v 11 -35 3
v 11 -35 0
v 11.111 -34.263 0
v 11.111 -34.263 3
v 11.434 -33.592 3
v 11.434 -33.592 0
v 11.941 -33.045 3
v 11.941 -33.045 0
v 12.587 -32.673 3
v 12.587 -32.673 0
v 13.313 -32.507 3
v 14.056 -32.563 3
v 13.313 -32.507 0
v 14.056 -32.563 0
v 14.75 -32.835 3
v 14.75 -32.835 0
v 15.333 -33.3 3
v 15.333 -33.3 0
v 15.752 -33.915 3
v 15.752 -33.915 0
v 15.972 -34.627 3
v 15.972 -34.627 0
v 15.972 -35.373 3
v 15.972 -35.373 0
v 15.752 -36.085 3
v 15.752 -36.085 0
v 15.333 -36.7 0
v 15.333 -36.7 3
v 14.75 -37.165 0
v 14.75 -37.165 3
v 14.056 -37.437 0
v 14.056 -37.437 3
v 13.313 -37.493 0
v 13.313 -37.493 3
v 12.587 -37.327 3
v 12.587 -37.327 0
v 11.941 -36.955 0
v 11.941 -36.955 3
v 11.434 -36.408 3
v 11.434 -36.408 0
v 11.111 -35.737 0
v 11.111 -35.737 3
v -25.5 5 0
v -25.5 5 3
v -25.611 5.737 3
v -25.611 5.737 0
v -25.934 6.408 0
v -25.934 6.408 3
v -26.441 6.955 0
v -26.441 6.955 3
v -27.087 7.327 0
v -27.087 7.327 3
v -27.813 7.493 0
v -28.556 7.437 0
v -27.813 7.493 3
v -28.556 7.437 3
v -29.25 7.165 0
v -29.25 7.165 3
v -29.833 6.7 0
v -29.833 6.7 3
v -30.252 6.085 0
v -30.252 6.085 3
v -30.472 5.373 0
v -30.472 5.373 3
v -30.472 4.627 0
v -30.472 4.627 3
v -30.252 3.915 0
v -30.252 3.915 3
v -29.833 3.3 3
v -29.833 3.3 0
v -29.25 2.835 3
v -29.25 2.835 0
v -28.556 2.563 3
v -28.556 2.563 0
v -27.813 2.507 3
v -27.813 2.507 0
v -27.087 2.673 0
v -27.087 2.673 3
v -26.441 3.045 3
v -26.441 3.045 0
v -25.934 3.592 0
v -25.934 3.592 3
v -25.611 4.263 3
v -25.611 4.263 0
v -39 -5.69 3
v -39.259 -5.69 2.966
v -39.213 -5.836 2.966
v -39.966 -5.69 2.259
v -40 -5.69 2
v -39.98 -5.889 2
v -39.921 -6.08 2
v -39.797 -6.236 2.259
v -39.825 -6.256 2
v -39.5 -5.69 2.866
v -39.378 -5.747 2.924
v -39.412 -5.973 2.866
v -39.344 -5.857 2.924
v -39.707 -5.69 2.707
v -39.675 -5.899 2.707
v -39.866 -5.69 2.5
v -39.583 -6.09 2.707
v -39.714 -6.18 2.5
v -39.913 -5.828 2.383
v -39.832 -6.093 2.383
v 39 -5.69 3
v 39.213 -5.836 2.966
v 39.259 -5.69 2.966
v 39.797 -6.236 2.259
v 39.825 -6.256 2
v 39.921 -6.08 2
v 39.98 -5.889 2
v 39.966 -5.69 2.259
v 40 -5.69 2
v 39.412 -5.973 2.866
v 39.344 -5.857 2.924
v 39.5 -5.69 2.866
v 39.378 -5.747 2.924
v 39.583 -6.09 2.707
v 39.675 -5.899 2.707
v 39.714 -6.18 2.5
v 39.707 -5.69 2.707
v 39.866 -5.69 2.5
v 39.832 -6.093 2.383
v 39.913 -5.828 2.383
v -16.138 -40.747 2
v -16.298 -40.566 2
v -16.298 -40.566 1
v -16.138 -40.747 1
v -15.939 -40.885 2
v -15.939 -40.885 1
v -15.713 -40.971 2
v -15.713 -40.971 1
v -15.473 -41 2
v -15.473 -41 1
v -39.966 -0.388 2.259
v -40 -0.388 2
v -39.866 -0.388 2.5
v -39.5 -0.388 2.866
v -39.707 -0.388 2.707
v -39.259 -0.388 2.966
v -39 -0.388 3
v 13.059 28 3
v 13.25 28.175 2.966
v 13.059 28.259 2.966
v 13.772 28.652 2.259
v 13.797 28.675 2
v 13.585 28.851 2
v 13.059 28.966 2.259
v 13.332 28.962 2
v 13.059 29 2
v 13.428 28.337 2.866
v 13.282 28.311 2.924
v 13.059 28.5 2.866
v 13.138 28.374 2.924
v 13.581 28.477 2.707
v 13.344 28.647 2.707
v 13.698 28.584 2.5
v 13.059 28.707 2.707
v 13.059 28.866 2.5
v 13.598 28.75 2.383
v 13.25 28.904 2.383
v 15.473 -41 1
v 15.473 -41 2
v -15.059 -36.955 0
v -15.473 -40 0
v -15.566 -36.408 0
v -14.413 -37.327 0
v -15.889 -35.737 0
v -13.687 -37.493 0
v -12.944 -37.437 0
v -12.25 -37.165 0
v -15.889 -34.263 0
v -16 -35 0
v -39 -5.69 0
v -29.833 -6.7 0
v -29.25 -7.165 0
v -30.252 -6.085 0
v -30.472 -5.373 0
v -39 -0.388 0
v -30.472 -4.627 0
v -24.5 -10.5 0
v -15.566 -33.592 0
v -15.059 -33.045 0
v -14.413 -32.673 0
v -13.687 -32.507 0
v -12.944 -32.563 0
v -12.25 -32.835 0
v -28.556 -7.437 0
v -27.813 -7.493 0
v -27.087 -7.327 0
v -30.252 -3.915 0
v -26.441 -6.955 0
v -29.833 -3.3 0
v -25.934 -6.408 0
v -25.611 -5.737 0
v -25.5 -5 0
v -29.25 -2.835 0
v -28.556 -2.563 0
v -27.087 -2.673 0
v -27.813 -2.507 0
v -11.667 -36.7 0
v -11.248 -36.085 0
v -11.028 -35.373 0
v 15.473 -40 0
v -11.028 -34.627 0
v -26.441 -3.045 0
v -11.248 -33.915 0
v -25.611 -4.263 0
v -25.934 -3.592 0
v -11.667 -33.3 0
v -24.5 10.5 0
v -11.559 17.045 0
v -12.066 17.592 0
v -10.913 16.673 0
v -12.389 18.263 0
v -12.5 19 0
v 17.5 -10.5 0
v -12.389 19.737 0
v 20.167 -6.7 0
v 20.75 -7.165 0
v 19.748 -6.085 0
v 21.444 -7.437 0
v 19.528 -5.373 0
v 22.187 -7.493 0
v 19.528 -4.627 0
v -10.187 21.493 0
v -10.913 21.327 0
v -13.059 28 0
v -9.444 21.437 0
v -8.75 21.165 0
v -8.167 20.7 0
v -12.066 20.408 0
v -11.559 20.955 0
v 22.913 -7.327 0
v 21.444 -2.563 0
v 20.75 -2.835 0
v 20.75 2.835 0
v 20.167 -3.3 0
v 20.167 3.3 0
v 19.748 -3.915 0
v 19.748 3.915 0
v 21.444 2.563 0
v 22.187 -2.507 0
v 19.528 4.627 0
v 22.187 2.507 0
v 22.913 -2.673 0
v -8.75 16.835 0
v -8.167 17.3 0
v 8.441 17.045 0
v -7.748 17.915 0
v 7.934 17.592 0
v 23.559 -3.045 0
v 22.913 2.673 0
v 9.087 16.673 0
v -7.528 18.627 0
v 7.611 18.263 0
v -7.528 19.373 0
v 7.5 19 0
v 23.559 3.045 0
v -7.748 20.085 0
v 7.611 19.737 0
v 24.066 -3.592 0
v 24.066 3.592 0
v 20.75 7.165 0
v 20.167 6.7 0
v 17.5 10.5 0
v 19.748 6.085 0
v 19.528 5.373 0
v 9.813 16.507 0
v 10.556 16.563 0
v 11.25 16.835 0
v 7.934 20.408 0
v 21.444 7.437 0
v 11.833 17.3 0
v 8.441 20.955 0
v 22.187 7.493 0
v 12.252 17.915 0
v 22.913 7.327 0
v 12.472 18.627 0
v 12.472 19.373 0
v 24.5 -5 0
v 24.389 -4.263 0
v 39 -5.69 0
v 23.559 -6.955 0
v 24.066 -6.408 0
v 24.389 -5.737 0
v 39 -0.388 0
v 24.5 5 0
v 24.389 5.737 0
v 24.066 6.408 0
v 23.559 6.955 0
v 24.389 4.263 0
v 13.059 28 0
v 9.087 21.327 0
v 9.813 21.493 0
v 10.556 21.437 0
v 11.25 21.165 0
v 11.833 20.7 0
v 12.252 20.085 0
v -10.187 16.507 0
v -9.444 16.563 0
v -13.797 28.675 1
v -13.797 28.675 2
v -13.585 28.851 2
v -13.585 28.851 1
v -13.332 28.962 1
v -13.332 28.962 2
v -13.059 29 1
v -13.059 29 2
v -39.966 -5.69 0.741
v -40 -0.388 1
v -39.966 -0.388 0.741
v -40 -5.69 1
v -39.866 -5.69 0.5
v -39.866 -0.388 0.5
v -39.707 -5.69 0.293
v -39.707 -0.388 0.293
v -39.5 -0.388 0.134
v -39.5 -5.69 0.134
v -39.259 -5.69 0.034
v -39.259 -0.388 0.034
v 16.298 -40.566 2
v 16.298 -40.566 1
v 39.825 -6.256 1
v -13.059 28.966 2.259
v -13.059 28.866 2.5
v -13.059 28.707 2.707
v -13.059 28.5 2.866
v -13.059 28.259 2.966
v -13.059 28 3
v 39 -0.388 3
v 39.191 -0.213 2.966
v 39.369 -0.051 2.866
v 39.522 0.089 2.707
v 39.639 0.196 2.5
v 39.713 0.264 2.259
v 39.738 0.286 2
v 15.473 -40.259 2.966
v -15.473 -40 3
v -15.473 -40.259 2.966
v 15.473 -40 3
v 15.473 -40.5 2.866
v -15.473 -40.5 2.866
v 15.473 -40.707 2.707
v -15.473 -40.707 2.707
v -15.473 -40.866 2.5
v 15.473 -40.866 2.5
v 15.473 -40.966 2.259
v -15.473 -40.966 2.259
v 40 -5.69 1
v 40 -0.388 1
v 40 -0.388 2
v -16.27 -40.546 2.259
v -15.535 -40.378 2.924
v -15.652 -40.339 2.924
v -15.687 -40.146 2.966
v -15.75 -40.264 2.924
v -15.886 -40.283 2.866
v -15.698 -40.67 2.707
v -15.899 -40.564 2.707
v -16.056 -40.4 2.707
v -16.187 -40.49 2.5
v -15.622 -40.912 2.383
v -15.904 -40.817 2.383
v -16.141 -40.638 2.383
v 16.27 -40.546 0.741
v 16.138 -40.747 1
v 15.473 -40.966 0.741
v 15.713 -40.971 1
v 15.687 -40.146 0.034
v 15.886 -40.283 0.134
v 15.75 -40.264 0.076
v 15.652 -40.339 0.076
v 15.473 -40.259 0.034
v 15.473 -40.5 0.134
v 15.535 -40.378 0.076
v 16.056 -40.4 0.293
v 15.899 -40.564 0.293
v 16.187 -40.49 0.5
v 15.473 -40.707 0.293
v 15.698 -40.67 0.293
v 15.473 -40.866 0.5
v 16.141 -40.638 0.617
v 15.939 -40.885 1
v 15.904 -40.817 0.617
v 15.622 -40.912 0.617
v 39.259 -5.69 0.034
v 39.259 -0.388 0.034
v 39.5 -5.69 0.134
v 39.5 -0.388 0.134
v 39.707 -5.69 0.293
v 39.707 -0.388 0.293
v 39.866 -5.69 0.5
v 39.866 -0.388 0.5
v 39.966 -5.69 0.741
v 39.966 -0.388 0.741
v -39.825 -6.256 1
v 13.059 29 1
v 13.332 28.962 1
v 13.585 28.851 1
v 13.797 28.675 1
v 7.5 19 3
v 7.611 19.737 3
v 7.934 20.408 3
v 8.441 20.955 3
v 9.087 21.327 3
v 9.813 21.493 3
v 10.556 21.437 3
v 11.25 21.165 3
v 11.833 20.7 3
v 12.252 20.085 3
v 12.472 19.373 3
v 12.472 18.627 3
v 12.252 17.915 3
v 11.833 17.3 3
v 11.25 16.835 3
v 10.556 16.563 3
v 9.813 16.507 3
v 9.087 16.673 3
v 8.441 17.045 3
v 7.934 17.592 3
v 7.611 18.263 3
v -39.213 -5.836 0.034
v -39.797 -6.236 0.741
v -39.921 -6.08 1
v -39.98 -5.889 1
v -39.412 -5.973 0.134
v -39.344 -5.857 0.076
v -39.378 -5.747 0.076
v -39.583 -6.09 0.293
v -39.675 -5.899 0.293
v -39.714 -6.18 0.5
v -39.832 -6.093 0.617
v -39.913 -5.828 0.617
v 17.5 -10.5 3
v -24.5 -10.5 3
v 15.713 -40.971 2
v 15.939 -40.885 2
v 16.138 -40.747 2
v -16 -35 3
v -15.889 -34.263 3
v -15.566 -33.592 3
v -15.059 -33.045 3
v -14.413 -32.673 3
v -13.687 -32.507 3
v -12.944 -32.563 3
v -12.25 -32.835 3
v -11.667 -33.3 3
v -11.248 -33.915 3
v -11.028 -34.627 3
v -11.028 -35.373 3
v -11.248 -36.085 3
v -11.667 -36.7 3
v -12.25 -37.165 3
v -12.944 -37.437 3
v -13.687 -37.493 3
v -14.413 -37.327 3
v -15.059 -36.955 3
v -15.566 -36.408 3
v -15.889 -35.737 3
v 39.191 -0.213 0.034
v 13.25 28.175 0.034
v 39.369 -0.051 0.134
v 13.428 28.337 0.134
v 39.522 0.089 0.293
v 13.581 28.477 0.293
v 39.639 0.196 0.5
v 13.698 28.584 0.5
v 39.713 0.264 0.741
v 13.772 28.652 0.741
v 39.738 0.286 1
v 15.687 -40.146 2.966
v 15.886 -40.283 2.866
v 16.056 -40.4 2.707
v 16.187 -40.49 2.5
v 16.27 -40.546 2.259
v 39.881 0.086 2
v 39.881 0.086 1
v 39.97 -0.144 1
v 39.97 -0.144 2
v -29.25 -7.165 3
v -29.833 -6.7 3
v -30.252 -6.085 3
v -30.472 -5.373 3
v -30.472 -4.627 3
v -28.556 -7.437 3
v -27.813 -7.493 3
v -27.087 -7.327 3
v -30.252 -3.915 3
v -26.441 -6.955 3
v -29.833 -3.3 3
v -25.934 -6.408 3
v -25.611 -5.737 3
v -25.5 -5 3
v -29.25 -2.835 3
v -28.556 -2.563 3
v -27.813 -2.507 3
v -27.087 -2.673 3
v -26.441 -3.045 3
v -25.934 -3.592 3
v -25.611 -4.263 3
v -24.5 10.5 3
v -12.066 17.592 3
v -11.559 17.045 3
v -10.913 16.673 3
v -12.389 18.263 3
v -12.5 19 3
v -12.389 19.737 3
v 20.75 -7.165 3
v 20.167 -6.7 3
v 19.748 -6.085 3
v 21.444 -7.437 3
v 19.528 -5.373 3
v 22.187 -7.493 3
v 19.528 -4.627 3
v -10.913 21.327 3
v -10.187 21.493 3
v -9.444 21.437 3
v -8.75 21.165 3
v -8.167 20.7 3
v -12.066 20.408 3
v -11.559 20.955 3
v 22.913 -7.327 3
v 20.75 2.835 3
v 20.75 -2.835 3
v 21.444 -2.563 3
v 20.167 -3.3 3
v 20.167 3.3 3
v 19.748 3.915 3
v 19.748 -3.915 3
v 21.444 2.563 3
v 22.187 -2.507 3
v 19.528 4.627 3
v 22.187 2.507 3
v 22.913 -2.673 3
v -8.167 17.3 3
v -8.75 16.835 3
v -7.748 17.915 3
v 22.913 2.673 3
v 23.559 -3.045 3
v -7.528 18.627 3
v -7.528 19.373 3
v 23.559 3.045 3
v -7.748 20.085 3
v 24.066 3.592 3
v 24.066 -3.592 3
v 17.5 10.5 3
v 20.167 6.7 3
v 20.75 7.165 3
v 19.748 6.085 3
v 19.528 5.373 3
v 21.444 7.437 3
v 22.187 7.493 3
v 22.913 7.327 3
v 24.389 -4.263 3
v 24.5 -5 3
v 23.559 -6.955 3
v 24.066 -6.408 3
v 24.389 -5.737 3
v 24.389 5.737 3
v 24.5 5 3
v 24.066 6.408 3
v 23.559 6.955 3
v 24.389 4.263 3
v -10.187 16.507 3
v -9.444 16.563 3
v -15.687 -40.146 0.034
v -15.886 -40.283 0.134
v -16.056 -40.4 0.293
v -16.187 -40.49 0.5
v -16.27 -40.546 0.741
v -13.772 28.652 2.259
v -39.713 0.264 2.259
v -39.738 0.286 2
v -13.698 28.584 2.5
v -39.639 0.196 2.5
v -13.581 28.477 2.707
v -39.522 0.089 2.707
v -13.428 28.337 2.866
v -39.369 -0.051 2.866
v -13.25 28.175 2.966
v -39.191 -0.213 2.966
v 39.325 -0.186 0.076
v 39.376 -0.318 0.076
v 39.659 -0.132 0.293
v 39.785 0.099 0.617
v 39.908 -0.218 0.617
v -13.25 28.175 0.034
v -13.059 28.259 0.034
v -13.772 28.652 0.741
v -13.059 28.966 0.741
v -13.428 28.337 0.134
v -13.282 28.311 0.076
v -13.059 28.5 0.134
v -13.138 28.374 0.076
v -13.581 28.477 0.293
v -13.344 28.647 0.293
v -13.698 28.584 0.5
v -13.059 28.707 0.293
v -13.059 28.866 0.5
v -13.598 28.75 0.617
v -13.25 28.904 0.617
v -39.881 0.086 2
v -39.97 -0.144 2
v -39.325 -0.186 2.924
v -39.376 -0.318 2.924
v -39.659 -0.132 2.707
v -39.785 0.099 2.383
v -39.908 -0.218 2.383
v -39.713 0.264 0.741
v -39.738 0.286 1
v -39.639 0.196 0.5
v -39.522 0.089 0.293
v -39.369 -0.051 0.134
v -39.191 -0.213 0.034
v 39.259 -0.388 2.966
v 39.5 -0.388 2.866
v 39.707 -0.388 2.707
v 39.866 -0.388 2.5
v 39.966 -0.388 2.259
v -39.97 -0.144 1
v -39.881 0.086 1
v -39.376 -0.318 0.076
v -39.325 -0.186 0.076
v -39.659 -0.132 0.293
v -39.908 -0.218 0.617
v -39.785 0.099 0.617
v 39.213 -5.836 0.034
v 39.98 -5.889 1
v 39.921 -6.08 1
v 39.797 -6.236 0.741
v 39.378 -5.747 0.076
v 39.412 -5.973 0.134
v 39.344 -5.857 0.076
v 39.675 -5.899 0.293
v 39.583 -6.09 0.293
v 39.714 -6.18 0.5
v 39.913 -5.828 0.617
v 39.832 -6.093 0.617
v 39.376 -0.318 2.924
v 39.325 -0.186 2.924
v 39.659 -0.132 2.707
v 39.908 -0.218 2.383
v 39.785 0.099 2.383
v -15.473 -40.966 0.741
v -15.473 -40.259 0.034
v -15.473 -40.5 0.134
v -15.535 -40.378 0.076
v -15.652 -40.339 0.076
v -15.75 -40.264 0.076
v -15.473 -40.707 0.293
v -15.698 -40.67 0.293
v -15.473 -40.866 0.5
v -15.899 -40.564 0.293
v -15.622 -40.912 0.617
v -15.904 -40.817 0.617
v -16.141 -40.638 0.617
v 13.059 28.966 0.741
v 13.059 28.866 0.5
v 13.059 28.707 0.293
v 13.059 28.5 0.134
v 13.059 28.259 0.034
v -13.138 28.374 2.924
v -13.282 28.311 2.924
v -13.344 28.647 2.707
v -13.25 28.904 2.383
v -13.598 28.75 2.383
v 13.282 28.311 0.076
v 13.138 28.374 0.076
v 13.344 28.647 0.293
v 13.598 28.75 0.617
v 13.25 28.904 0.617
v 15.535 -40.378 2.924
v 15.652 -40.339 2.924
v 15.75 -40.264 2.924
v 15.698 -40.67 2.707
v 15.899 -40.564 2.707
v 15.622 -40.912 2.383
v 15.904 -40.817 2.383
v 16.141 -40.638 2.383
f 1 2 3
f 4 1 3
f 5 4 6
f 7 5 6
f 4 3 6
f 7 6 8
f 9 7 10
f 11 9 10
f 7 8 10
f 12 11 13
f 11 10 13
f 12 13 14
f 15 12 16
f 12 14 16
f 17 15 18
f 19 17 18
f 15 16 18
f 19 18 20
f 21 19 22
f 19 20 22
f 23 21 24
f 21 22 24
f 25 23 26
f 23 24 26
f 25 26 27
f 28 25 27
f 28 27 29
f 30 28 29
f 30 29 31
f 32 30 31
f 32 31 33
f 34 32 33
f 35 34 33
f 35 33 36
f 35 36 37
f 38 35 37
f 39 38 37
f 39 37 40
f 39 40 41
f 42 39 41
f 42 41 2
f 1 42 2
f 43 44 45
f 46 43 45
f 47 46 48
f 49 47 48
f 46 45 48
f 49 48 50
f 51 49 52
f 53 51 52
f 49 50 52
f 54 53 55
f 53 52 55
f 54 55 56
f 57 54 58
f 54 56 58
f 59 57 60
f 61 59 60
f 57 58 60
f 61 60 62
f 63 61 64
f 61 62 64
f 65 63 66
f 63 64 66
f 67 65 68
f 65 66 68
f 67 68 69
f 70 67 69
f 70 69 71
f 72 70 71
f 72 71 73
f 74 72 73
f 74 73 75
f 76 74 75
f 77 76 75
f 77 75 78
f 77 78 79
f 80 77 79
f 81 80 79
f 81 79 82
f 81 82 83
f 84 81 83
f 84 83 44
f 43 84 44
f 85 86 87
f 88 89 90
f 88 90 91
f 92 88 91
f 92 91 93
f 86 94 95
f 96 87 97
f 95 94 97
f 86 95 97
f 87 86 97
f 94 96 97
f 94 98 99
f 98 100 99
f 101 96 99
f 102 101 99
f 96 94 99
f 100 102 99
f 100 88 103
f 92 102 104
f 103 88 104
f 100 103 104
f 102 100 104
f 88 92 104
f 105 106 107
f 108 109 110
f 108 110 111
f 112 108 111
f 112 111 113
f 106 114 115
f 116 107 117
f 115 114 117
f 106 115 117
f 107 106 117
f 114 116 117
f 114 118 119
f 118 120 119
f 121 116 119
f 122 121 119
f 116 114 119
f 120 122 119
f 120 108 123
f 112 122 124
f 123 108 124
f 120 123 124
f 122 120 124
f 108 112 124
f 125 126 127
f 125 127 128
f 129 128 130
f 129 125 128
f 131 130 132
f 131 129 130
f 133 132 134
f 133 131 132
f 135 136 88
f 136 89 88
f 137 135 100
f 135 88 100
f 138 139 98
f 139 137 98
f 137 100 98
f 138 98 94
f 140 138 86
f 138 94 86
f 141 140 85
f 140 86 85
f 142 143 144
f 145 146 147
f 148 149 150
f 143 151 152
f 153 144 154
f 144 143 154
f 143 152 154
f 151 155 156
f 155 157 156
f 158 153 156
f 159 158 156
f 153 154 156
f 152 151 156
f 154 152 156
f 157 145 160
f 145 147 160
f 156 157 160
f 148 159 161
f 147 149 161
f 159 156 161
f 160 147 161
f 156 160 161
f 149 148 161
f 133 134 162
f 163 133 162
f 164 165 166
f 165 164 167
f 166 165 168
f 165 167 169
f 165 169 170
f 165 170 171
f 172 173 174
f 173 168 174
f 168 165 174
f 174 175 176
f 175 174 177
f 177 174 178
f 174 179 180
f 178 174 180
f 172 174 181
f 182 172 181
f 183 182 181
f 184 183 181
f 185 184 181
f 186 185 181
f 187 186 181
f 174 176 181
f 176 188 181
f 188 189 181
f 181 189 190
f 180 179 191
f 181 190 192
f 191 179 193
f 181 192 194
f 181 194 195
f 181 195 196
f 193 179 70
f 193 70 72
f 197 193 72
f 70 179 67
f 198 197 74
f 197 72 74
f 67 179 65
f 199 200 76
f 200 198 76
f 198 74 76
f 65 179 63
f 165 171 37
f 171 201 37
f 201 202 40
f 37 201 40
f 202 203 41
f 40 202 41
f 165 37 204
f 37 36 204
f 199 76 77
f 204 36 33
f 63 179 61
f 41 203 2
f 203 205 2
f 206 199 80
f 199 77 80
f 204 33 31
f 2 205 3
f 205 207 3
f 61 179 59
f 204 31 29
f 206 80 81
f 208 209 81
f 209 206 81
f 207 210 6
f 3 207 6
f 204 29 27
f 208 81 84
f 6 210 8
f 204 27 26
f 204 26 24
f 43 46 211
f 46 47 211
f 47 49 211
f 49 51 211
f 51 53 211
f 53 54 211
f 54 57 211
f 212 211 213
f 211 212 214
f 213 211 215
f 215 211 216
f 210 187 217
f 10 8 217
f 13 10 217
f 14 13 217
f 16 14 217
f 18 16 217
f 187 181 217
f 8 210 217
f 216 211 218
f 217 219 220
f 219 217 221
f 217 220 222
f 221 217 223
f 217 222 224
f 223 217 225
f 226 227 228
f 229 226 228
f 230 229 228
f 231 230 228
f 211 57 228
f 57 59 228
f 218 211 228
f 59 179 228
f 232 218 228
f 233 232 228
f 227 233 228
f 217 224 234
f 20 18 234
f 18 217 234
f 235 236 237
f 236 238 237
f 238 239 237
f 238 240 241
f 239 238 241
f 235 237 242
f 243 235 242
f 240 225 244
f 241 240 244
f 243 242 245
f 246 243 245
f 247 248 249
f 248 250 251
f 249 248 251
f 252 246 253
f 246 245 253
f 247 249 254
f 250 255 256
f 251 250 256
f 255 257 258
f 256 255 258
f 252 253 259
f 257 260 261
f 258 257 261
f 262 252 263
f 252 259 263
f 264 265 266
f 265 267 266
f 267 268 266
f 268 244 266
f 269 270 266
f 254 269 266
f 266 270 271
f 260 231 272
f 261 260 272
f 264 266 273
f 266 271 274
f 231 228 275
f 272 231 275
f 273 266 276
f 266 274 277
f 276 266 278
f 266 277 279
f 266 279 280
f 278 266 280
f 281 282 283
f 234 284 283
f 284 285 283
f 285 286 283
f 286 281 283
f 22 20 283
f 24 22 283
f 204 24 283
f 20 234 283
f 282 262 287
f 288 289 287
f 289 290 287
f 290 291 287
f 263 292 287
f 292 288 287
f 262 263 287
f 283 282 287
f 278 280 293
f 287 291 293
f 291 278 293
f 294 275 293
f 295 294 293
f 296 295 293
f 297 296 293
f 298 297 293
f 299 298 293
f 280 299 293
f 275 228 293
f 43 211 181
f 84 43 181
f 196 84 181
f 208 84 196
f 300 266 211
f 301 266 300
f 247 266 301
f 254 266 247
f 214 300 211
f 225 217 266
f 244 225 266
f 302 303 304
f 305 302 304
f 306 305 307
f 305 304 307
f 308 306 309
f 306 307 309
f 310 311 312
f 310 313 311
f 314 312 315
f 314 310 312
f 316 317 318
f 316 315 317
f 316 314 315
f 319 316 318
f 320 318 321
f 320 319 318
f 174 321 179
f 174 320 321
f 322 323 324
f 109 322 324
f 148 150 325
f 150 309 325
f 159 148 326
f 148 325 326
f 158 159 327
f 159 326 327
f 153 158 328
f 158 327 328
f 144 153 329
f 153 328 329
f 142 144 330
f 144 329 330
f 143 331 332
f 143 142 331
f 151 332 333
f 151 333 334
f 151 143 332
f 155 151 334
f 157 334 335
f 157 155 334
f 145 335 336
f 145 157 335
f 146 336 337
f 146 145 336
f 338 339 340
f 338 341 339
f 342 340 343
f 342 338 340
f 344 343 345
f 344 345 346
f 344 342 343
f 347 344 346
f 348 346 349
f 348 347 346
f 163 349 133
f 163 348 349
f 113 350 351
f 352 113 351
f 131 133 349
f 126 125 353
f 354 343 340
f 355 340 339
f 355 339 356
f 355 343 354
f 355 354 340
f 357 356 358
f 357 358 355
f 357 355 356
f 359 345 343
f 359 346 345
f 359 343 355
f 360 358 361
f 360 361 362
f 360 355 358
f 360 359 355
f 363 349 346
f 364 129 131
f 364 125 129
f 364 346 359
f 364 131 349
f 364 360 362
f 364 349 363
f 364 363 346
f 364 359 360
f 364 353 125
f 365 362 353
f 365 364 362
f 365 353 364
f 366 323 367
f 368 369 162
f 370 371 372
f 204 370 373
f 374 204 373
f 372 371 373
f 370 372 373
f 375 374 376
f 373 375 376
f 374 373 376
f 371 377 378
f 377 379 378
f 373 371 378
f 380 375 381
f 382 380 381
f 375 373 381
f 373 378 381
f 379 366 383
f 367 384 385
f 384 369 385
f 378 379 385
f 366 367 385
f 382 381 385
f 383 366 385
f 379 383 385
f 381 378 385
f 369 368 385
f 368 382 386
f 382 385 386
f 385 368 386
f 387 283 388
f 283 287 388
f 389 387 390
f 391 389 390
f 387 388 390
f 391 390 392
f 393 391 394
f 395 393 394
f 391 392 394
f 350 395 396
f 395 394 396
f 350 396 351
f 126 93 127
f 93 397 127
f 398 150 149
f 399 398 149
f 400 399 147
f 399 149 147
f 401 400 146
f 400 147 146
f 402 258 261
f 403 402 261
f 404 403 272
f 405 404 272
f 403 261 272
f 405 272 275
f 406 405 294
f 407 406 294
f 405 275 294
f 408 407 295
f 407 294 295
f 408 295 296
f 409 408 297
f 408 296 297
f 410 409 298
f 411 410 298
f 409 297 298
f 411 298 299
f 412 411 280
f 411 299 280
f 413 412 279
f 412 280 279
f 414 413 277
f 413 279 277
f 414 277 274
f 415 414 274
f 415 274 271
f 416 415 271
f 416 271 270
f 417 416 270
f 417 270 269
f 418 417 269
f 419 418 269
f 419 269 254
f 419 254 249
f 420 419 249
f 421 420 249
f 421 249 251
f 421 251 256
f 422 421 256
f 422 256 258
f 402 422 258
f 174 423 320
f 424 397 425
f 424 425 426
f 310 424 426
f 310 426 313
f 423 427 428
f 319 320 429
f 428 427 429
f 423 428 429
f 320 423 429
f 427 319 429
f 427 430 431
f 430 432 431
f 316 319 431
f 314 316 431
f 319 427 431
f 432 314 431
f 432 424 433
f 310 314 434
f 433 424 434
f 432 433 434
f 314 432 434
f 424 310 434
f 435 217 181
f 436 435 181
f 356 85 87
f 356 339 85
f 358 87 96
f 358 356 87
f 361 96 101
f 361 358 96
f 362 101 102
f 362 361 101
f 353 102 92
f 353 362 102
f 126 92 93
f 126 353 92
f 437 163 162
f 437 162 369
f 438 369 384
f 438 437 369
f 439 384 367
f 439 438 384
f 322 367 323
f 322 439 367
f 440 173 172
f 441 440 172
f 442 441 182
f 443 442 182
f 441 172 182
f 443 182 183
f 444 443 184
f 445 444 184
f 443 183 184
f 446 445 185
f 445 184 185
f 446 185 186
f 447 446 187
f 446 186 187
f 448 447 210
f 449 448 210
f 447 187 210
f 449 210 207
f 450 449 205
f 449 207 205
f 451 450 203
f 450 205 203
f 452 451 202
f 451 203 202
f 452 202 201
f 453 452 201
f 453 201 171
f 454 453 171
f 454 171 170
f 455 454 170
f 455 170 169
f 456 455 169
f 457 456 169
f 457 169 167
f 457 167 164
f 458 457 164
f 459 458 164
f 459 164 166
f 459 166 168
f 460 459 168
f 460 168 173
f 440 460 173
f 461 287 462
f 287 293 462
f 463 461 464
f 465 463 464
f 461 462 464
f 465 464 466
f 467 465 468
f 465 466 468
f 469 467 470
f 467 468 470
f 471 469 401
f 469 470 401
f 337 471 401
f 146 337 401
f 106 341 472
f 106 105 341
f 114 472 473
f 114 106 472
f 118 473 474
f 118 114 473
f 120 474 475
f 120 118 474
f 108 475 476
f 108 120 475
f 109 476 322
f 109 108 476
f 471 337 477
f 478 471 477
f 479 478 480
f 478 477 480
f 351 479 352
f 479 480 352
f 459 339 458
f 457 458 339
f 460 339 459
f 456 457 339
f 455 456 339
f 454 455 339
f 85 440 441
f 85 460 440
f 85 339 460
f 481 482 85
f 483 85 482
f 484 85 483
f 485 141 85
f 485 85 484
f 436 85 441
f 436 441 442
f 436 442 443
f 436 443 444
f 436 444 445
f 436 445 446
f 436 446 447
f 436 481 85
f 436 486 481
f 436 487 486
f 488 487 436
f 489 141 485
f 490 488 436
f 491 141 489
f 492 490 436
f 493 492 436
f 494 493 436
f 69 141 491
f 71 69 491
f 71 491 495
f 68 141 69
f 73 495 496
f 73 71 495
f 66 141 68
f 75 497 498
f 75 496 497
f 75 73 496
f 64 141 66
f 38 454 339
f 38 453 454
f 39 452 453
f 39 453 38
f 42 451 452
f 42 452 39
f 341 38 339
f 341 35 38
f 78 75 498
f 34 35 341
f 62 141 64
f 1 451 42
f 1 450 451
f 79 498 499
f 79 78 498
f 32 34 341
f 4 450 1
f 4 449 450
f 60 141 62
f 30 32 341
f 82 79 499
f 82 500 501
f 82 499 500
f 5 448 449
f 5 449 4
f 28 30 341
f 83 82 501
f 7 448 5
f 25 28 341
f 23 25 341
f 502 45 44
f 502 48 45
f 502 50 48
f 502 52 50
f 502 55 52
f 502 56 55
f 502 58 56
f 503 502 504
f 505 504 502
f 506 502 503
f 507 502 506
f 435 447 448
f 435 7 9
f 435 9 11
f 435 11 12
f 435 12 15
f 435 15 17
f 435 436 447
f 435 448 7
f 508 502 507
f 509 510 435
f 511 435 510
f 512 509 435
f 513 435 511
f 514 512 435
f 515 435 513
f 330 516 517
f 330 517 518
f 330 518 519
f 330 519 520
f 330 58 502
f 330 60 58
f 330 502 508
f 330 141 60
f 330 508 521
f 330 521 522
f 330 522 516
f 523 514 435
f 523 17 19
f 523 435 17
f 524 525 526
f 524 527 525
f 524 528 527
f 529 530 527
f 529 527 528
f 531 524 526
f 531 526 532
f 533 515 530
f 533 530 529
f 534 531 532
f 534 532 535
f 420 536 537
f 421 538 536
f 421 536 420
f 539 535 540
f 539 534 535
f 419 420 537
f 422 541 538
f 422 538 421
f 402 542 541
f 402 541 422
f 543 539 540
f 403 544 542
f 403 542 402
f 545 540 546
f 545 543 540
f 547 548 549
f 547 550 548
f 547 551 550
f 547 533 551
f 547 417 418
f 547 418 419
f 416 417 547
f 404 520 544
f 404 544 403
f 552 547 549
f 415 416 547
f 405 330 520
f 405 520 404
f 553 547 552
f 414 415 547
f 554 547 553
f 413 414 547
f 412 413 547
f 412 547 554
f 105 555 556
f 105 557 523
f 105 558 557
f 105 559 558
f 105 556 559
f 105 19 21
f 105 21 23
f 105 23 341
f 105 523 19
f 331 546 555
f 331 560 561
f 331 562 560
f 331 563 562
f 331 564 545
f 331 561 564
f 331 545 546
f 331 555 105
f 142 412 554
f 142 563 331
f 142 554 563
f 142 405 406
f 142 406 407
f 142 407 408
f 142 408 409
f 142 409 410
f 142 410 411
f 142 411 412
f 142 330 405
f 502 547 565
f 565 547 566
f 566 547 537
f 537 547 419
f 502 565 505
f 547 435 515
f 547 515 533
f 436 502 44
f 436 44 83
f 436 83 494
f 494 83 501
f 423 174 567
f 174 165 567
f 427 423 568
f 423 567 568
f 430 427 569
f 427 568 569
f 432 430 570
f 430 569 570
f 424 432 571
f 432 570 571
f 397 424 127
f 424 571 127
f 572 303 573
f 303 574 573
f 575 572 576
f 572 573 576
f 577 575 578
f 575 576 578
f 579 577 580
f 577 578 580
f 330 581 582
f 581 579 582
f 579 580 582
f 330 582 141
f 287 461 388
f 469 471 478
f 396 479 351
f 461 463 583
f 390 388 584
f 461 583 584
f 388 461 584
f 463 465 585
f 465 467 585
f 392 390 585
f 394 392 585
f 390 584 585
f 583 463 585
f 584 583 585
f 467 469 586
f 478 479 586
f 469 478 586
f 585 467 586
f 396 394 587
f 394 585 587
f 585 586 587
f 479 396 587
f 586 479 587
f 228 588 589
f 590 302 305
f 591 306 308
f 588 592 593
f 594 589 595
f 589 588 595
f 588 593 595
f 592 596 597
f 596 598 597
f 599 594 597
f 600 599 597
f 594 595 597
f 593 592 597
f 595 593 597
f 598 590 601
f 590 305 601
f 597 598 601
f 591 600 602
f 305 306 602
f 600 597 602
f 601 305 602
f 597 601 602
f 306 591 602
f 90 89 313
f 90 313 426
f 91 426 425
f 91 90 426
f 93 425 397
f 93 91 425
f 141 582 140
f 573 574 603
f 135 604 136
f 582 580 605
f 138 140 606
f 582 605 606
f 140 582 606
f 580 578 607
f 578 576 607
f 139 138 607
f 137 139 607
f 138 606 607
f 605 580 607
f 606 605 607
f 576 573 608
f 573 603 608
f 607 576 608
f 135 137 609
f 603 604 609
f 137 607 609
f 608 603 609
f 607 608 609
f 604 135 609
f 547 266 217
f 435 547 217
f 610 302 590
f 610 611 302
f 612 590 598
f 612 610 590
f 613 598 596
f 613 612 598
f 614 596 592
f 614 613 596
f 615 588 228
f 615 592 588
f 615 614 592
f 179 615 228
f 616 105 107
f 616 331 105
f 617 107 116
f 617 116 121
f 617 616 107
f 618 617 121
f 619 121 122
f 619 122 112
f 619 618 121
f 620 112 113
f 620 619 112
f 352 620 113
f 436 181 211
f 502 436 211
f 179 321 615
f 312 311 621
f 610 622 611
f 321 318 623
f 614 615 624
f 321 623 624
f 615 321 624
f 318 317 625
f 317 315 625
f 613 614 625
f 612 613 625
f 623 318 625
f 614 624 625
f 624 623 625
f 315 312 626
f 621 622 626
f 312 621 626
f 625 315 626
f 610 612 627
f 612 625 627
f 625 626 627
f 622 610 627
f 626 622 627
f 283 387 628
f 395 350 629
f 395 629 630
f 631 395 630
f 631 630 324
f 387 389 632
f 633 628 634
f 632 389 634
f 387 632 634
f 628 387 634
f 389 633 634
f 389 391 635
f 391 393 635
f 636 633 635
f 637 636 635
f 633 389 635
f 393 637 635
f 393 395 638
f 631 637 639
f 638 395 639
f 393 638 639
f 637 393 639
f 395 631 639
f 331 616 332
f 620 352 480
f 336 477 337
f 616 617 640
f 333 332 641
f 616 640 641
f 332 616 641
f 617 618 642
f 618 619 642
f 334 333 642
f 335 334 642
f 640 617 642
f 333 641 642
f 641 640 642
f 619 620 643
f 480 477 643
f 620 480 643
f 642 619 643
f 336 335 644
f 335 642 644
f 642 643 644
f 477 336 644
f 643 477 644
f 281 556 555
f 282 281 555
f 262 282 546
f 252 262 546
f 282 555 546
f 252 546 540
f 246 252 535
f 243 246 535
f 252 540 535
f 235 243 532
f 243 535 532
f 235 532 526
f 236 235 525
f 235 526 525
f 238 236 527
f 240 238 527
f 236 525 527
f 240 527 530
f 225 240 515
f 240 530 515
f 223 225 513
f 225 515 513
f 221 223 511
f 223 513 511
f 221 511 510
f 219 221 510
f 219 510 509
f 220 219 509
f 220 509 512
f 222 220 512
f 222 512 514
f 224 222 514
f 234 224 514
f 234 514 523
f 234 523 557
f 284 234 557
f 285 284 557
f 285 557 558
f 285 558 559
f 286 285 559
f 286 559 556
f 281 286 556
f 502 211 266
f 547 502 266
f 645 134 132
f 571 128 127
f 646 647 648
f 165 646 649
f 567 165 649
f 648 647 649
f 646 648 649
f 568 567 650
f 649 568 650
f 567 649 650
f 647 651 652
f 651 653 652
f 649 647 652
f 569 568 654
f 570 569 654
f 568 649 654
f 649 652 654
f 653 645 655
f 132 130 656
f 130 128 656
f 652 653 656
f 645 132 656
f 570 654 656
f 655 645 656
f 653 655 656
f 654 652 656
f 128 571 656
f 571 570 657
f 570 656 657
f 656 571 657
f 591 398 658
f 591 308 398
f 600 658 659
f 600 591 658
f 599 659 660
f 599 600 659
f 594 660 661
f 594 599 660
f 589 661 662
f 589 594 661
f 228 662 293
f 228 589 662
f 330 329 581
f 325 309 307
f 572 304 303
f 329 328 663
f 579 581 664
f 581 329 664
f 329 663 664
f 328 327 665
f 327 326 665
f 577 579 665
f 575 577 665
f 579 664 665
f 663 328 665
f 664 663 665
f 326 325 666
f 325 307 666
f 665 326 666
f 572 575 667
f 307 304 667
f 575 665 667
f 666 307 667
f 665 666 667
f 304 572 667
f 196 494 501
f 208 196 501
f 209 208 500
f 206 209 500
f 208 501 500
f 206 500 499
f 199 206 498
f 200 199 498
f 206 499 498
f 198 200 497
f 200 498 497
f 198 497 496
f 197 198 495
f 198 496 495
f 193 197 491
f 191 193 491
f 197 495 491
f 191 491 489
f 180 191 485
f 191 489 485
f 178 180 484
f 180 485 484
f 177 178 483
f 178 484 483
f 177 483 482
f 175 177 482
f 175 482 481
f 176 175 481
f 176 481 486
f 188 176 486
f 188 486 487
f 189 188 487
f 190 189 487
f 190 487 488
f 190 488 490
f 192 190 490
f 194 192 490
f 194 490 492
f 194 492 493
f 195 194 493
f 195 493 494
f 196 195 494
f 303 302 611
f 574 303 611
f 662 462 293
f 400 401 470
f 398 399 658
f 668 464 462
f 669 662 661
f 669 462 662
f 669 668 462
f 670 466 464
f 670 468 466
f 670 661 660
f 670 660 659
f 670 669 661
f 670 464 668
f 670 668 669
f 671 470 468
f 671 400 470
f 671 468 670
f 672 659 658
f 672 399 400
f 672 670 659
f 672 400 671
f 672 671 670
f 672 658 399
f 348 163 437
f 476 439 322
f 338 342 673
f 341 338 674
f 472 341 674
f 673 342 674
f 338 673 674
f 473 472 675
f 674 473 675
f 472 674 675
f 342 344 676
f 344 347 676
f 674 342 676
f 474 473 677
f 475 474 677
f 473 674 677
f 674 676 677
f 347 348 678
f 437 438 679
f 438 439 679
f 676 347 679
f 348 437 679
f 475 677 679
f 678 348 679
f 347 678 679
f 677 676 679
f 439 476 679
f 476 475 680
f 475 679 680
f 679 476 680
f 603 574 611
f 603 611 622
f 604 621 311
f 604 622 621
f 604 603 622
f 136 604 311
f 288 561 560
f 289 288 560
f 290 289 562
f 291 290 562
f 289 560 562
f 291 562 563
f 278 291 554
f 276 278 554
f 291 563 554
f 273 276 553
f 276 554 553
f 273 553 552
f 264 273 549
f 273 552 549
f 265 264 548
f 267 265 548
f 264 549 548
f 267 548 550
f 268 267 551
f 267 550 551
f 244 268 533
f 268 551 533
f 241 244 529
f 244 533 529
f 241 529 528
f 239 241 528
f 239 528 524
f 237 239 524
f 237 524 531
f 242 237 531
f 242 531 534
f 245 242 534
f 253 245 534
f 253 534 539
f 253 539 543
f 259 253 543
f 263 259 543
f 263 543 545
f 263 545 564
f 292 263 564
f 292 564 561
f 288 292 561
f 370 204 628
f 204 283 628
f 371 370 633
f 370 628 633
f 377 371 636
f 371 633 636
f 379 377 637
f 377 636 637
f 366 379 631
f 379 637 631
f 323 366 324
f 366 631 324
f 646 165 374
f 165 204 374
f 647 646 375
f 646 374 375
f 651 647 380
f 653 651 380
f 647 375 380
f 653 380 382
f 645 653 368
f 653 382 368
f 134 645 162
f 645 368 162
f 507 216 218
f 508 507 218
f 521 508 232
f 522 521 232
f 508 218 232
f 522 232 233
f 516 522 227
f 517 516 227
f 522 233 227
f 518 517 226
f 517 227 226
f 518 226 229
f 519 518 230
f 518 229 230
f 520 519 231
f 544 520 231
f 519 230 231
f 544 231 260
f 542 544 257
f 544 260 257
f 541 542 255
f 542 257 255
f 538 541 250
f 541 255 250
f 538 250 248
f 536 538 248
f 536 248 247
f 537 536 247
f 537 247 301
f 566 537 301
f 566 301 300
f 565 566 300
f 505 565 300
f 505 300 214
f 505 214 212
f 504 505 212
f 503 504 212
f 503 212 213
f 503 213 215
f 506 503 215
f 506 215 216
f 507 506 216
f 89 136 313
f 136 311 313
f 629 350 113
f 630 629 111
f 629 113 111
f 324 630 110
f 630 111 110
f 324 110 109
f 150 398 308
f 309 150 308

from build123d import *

# Parameters (mm, degrees)
BOSS_EXTRUDE1_DEPTH = 3
SKETCH2_R           = 2.5
CUT_EXTRUDE1_DEPTH  = 10
CUT_EXTRUDE2_DEPTH  = 10
SKETCH5_R           = 2.5
CUT_EXTRUDE3_DEPTH  = 10
FILLET1_R           = 1


with BuildPart() as part:
    # Sketch1 → Boss-Extrude1 (new body)
    with BuildSketch(Plane.XY):
        Polygon((-13.5, 29), (-40, 0), (-40, -6), (-16, -41), (16, -41), (40, -6), (40, 0), (13.5, 29), align=None)
    extrude(amount=BOSS_EXTRUDE1_DEPTH)

    # Sketch2 → Cut-Extrude1 (cut)
    with BuildSketch(Plane(origin=(0, 0, 0), x_dir=(-1, 0, 0), z_dir=(0, 0, -1))):
        with Locations((-10, 19)):
            Circle(SKETCH2_R)
        with Locations((10, 19)):
            Circle(SKETCH2_R)
        with Locations((-13.5, -35)):
            Circle(SKETCH2_R)
        with Locations((13.5, -35)):
            Circle(SKETCH2_R)
    extrude(amount=-CUT_EXTRUDE1_DEPTH, mode=Mode.SUBTRACT)

    # Sketch3 → Cut-Extrude2 (cut)
    with BuildSketch(Plane(origin=(0, 0, 0), x_dir=(-1, 0, 0), z_dir=(0, 0, -1))):
        Polygon((24.5, 0), (24.5, 10.5), (-17.5, 10.5), (-17.5, -10.5), (24.5, -10.5), align=None)
    extrude(amount=-CUT_EXTRUDE2_DEPTH, mode=Mode.SUBTRACT)

    # Sketch5 → Cut-Extrude3 (cut)
    with BuildSketch(Plane.XY.offset(3)):
        with Locations((-28, -5)):
            Circle(SKETCH5_R)
        with Locations((-28, 5)):
            Circle(SKETCH5_R)
        with Locations((22, -5)):
            Circle(SKETCH5_R)
        with Locations((22, 5)):
            Circle(SKETCH5_R)
    extrude(amount=-CUT_EXTRUDE3_DEPTH, mode=Mode.SUBTRACT)

    # Fillet1
    fillet1_edges = [part.edges().sort_by_distance(p)[0] for p in [
        (-40, -3, 3),
        (-26.75, 14.5, 0),
        (0, 29, 0),
        (-28, -23.5, 3),
        (13.5, 29, 1.5),
        (40, 0, 1.5),
        (40, -6, 1.5),
        (16, -41, 1.5),
        (-16, -41, 1.5),
        (-40, -6, 1.5),
        (-40, 0, 1.5),
        (-13.5, 29, 1.5),
        (0, -41, 3),
        (28, -23.5, 3),
        (40, -3, 3),
        (26.75, 14.5, 3),
        (0, 29, 3),
        (-26.75, 14.5, 3),
        (26.75, 14.5, 0),
        (40, -3, 0),
        (28, -23.5, 0),
        (0, -41, 0),
        (-28, -23.5, 0),
        (-40, -3, 0),
    ]]
    fillet(fillet1_edges, radius=FILLET1_R)


solid = part.part
